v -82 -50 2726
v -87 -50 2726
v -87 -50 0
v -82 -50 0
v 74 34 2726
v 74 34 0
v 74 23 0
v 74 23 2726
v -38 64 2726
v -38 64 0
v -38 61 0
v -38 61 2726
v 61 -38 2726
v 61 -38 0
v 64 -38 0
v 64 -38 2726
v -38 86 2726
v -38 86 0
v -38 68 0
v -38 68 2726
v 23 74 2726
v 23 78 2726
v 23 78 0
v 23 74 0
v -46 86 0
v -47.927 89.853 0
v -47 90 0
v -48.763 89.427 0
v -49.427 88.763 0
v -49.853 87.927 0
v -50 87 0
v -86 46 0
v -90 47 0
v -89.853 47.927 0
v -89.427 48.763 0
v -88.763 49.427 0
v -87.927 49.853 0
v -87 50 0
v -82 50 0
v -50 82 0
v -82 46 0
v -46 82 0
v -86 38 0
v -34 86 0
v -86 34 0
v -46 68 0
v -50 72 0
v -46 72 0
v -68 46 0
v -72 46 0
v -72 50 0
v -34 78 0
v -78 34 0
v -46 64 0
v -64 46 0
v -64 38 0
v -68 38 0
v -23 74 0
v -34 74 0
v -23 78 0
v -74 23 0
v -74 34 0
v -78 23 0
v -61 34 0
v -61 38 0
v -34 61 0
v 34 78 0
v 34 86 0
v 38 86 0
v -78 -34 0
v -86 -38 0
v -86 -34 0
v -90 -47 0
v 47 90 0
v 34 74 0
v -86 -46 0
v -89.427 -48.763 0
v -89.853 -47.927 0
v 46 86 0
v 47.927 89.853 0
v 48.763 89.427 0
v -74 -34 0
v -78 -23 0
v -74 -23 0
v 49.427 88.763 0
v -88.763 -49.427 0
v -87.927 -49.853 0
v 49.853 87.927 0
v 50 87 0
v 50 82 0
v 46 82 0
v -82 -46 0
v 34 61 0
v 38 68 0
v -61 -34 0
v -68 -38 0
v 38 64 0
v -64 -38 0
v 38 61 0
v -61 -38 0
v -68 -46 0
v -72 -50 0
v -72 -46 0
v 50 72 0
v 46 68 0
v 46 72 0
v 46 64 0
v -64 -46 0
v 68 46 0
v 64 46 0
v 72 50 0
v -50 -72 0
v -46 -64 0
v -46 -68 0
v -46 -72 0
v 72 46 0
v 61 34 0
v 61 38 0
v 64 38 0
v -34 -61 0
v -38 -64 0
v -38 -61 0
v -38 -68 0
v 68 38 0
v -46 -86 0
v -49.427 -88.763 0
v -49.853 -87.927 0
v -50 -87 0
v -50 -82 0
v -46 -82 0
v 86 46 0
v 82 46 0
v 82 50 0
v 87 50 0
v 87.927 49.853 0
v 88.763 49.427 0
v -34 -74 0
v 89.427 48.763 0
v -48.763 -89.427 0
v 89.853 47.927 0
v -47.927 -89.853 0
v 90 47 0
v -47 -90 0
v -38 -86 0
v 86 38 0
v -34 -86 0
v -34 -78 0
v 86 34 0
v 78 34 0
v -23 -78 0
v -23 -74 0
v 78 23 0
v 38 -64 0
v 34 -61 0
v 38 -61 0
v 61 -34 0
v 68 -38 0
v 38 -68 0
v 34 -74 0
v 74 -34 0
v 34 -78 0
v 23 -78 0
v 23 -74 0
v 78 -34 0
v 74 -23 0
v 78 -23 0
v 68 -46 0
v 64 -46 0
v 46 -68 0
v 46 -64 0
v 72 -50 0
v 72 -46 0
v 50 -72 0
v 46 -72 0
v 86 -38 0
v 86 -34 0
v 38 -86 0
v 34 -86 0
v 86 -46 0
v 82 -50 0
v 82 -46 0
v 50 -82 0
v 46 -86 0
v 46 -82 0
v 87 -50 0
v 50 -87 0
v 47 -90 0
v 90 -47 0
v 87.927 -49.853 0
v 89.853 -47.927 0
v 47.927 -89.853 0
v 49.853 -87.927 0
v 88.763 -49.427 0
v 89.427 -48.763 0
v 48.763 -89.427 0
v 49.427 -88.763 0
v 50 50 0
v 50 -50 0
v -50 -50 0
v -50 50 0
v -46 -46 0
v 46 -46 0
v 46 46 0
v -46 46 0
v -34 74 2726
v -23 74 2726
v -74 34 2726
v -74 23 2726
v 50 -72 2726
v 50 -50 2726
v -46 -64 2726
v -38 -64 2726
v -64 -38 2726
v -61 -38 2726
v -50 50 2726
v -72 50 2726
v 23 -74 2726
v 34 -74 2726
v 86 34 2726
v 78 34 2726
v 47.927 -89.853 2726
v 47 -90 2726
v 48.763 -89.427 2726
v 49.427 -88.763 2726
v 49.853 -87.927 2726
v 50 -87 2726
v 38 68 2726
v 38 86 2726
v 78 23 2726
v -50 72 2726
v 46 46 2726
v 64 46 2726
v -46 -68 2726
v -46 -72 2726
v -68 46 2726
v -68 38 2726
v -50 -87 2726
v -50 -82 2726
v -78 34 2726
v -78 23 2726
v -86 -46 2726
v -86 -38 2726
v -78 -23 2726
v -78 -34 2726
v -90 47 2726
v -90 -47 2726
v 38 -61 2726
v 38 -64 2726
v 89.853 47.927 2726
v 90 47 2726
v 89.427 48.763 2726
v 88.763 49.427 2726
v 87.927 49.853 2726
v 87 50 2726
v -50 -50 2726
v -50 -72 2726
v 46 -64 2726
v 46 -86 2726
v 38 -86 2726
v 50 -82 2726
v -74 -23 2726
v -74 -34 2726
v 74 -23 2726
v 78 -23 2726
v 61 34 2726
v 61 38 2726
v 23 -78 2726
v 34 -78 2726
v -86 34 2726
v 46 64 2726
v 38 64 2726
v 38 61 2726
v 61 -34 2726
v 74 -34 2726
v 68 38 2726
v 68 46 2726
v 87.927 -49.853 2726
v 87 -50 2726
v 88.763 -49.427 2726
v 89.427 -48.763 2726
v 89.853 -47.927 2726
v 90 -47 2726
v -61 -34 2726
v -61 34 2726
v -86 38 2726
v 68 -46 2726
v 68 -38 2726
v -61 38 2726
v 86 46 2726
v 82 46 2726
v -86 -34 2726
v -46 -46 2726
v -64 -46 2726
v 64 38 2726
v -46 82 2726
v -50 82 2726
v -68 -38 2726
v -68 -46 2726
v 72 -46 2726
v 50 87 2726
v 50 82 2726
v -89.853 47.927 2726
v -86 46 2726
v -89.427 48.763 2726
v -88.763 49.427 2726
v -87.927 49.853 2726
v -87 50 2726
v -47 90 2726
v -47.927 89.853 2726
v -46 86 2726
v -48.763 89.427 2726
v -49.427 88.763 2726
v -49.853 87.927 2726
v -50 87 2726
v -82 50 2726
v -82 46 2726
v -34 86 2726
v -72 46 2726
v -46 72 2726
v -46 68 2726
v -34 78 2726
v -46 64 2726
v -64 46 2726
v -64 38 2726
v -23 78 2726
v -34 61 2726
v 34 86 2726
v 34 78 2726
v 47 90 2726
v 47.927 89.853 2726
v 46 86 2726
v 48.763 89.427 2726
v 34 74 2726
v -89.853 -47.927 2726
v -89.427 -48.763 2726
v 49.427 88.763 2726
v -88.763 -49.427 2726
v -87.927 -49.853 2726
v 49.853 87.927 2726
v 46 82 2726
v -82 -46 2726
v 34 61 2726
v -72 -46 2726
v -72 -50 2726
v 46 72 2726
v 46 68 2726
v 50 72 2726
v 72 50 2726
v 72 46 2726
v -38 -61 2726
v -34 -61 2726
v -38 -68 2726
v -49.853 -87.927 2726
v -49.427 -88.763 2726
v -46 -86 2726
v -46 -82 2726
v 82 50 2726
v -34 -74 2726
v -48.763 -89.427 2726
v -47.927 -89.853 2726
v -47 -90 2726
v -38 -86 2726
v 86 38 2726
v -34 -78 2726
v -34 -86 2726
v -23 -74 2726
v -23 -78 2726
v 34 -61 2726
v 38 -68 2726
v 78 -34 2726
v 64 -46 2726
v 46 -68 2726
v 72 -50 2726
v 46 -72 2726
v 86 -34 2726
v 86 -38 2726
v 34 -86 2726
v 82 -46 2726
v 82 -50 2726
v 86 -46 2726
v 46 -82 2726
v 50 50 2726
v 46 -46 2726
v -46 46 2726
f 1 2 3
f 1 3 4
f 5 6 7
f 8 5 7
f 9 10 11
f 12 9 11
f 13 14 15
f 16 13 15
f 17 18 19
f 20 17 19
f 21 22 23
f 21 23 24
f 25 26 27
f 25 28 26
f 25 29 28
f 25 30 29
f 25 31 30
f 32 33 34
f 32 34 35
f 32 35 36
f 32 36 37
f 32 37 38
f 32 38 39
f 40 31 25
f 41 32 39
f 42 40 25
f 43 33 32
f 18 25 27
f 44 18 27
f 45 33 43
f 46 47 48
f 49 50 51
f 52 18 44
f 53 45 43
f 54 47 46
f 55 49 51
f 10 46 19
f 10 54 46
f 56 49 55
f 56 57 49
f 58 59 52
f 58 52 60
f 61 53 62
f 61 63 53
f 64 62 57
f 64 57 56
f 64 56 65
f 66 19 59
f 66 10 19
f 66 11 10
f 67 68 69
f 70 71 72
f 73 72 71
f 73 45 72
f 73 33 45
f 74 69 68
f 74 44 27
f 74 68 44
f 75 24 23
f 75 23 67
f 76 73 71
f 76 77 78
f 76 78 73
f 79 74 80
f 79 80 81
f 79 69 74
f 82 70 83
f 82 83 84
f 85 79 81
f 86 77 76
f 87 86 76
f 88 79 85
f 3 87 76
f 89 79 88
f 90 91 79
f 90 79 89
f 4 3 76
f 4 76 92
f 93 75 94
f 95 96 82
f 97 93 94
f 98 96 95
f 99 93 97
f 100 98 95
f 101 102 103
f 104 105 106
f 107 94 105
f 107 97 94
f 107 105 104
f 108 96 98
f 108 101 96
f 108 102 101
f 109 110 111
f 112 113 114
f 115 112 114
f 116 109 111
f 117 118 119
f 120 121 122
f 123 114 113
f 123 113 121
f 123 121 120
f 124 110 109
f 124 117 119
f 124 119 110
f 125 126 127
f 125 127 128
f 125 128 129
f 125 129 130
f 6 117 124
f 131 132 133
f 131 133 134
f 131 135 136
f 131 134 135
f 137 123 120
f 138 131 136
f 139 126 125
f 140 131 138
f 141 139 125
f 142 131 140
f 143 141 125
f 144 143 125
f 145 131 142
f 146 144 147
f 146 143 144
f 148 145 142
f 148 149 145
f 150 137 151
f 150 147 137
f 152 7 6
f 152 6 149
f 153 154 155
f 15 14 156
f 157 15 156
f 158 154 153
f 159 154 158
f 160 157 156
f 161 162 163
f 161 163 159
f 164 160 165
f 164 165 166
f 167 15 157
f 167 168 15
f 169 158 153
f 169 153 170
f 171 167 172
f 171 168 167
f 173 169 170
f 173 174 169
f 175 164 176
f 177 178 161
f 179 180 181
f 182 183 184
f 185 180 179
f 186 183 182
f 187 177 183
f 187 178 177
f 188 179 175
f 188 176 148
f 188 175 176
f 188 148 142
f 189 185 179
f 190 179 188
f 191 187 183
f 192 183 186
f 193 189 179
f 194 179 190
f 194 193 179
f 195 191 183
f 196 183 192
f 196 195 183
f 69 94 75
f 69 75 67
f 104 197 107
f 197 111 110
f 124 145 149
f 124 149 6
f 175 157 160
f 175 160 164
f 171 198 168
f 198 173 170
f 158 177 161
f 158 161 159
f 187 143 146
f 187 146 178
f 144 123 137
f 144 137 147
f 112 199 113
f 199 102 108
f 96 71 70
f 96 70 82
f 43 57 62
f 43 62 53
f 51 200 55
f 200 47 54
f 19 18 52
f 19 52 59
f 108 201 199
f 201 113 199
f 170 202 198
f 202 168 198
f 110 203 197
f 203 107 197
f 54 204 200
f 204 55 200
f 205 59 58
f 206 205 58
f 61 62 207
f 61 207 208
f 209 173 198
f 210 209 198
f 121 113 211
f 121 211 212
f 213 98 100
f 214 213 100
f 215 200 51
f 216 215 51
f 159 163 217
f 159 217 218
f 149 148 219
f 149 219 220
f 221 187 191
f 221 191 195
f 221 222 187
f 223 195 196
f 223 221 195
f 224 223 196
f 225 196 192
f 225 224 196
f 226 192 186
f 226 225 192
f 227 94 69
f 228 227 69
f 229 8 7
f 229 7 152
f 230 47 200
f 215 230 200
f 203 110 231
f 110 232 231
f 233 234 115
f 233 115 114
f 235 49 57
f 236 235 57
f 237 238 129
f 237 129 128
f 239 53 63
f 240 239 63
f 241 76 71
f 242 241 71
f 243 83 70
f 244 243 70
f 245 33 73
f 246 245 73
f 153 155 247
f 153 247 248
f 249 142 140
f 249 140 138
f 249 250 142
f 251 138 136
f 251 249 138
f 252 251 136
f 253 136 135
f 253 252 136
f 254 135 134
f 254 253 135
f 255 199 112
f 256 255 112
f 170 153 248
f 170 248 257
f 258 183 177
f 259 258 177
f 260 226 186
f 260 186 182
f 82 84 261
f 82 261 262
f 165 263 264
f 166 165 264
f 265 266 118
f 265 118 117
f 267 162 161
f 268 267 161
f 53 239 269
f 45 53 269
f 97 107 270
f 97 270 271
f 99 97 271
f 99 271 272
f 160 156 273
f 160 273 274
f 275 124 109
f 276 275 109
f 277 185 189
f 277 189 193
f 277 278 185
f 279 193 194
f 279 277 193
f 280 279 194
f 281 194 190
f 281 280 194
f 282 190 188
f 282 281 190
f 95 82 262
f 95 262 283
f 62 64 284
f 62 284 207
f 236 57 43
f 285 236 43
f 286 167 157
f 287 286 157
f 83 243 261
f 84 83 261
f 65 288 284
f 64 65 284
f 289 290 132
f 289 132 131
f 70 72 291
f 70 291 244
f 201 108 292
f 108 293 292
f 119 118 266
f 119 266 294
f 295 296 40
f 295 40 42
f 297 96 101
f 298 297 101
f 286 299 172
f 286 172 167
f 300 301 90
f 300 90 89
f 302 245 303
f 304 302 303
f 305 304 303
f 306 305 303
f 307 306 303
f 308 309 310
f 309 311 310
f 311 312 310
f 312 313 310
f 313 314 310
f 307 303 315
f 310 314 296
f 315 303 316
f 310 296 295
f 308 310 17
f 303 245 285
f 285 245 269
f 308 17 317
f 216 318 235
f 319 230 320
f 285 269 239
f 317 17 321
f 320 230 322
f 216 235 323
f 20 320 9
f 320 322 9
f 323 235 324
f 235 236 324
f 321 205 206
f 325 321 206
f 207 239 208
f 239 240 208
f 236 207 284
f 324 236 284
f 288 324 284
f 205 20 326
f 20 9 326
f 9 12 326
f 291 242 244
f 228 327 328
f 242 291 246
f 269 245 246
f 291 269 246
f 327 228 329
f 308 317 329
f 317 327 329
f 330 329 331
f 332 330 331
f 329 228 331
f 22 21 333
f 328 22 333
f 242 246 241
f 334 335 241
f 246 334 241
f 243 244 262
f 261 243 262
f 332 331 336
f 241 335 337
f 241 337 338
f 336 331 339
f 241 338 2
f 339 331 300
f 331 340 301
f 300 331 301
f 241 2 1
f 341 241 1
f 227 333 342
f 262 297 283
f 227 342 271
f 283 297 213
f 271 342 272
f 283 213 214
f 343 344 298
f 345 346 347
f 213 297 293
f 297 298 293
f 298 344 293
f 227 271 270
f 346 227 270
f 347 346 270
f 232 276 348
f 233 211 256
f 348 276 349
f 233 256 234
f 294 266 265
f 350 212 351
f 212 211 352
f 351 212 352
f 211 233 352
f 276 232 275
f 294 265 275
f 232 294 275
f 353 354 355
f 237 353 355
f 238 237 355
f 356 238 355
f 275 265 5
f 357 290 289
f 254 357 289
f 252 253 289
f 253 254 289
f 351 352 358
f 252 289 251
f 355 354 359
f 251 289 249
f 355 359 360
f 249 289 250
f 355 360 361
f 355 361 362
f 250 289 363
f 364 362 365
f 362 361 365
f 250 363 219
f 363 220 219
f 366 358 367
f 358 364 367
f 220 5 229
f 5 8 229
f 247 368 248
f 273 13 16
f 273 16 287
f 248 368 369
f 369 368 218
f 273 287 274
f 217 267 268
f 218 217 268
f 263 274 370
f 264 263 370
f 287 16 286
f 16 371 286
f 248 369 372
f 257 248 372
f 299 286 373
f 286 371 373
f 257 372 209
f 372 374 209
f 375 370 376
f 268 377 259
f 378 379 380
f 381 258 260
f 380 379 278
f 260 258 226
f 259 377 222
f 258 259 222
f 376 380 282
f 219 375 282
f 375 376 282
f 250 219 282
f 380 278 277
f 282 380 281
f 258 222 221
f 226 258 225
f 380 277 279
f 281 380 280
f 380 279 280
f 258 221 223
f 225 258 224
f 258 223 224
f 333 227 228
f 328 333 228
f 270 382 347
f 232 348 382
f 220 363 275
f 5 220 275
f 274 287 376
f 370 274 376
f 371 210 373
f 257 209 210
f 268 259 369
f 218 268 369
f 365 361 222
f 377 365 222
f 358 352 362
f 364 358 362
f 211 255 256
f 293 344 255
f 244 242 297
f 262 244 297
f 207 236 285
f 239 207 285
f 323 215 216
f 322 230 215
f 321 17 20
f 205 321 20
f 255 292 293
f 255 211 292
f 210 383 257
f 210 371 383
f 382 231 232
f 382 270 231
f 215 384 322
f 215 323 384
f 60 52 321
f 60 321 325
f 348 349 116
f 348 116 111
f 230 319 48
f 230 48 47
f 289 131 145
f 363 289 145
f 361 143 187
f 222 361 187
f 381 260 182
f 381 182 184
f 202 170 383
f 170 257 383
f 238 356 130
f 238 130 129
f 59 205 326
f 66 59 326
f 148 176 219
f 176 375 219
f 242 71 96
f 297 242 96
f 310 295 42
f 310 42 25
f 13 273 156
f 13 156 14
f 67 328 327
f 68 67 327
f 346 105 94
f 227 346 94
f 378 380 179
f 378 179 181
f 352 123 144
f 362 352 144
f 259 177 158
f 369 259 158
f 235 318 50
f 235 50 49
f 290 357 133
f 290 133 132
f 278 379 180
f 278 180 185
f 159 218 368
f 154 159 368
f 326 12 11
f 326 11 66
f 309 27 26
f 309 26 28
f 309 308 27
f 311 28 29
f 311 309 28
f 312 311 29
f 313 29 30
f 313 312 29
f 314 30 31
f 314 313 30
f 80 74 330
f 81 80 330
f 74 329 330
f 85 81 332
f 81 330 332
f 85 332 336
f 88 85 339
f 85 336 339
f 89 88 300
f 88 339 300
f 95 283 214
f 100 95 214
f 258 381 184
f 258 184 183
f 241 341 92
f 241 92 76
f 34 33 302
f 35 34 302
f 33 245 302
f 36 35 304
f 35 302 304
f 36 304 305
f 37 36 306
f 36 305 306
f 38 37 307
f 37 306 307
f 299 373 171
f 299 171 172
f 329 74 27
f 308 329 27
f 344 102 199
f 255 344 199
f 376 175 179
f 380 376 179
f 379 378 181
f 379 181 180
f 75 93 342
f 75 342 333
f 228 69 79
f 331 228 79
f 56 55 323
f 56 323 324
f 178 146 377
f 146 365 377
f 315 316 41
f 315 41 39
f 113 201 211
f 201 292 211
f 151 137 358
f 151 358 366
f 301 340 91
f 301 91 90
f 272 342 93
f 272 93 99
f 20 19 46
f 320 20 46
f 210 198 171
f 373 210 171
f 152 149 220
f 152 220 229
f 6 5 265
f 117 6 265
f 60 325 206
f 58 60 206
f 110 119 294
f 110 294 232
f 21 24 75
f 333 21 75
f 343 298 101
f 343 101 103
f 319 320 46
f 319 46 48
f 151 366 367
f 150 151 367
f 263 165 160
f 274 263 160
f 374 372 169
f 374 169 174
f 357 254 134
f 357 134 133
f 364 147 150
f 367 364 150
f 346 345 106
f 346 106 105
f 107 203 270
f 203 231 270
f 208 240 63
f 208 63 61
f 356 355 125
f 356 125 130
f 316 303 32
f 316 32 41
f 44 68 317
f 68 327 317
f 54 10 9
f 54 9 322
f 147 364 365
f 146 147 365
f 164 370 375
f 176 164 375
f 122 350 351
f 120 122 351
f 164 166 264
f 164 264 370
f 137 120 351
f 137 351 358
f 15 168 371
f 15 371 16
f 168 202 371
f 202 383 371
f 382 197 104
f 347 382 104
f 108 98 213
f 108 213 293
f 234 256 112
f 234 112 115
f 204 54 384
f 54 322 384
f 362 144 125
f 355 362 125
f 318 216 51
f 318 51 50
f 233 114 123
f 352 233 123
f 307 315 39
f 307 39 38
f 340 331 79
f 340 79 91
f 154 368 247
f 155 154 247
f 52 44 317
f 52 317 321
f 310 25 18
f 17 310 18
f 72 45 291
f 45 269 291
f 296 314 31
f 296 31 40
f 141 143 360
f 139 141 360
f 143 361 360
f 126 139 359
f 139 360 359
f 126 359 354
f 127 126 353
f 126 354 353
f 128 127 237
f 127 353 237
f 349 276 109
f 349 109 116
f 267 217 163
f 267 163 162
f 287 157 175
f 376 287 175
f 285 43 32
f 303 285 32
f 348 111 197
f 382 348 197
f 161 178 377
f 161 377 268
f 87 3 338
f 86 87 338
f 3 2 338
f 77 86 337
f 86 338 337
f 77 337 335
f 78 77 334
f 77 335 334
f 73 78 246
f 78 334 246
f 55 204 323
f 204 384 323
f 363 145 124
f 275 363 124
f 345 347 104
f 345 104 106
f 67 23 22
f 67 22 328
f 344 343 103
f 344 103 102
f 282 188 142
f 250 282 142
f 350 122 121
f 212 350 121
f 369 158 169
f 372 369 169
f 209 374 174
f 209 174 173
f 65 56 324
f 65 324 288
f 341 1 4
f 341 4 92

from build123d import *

# Parameters (mm, degrees)
F1_DEPTH = 2726
F2_T     = -4
F3_R     = 3
F4_W     = 3
F4_H     = 4
F4_W_2   = 4
F4_H_2   = 11
F4_W_3   = 11
F4_H_3   = 3
F5_DEPTH = 2726


# Not quite as in the source:
# - a shell that OpenCascade refuses in one call is made with other operations: the cavity is built on its own and cut out


with BuildPart() as f1:
    # F0 (on Top) → F1 (new body)
    with BuildSketch(Plane.XY):
        Polygon((50, 90), (-50, 90), (-50, 82), (-46, 82), (-46, 86), (-38, 86), (-38, 68), (-46, 68), (-46, 72), (-50, 72), (-50, 50), (-72, 50), (-72, 46), (-68, 46), (-68, 38), (-86, 38), (-86, 46), (-82, 46), (-82, 50), (-90, 50), (-90, -50), (-82, -50), (-82, -46), (-86, -46), (-86, -38), (-68, -38), (-68, -46), (-72, -46), (-72, -50), (-50, -50), (-50, -72), (-46, -72), (-46, -68), (-38, -68), (-38, -86), (-46, -86), (-46, -82), (-50, -82), (-50, -90), (50, -90), (50, -82), (46, -82), (46, -86), (38, -86), (38, -68), (46, -68), (46, -72), (50, -72), (50, -50), (72, -50), (72, -46), (68, -46), (68, -38), (86, -38), (86, -46), (82, -46), (82, -50), (90, -50), (90, 50), (82, 50), (82, 46), (86, 46), (86, 38), (68, 38), (68, 46), (72, 46), (72, 50), (50, 50), (50, 72), (46, 72), (46, 68), (38, 68), (38, 86), (46, 86), (46, 82), (50, 82), align=None)
    extrude(amount=F1_DEPTH)

    # F2: a shell. OpenCascade refuses it in one call, so the cavity is built on its own and cut out:
    # the body offset inwards by the wall thickness, plus a prism from it out through each open face.
    f2_core = offset(f1.part, amount=F2_T, kind=Kind.INTERSECTION, mode=Mode.PRIVATE)
    f2_exits = [f2_core.faces().sort_by_distance(p)[0] for p in [
        (0, 0, 2722),
        (0, 0, 4),
    ]]
    add(f2_core, mode=Mode.SUBTRACT)
    extrude(f2_exits, amount=-F2_T, mode=Mode.SUBTRACT)

    # F3
    f3_edges = [f1.edges().sort_by_distance(p)[0] for p in [
        (-50, -90, 1363),
        (-90, -50, 1363),
        (50, -90, 1363),
        (90, -50, 1363),
        (90, 50, 1363),
        (50, 90, 1363),
        (-50, 90, 1363),
        (-90, 50, 1363),
    ]]
    fillet(f3_edges, radius=F3_R)

    # F4 (on face) → F5 (join, through all)
    with BuildSketch(Plane(origin=(0, 0, 0), x_dir=(1, 0, 0), z_dir=(0, 0, -1))):
        with Locations((-62.5, 36)):
            Rectangle(F4_W, F4_H)
        with Locations((-76, 28.5)):
            Rectangle(F4_W_2, F4_H_2)
        with Locations((62.5, 36)):
            Rectangle(F4_W, F4_H)
        with Locations((76, 28.5)):
            Rectangle(F4_W_2, F4_H_2)
        with Locations((76, -28.5)):
            Rectangle(F4_W_2, F4_H_2)
        with Locations((62.5, -36)):
            Rectangle(F4_W, F4_H)
        with Locations((-62.5, -36)):
            Rectangle(F4_W, F4_H)
        with Locations((-76, -28.5)):
            Rectangle(F4_W_2, F4_H_2)
        with Locations((-28.5, 76)):
            Rectangle(F4_W_3, F4_H)
        with Locations((-36, 62.5)):
            Rectangle(F4_W_2, F4_H_3)
        with Locations((28.5, 76)):
            Rectangle(F4_W_3, F4_H)
        with Locations((36, 62.5)):
            Rectangle(F4_W_2, F4_H_3)
        with Locations((-28.5, -76)):
            Rectangle(F4_W_3, F4_H)
        with Locations((36, -62.5)):
            Rectangle(F4_W_2, F4_H_3)
        with Locations((-36, -62.5)):
            Rectangle(F4_W_2, F4_H_3)
        with Locations((28.5, -76)):
            Rectangle(F4_W_3, F4_H)
    extrude(amount=-F5_DEPTH)


solid = f1.part
